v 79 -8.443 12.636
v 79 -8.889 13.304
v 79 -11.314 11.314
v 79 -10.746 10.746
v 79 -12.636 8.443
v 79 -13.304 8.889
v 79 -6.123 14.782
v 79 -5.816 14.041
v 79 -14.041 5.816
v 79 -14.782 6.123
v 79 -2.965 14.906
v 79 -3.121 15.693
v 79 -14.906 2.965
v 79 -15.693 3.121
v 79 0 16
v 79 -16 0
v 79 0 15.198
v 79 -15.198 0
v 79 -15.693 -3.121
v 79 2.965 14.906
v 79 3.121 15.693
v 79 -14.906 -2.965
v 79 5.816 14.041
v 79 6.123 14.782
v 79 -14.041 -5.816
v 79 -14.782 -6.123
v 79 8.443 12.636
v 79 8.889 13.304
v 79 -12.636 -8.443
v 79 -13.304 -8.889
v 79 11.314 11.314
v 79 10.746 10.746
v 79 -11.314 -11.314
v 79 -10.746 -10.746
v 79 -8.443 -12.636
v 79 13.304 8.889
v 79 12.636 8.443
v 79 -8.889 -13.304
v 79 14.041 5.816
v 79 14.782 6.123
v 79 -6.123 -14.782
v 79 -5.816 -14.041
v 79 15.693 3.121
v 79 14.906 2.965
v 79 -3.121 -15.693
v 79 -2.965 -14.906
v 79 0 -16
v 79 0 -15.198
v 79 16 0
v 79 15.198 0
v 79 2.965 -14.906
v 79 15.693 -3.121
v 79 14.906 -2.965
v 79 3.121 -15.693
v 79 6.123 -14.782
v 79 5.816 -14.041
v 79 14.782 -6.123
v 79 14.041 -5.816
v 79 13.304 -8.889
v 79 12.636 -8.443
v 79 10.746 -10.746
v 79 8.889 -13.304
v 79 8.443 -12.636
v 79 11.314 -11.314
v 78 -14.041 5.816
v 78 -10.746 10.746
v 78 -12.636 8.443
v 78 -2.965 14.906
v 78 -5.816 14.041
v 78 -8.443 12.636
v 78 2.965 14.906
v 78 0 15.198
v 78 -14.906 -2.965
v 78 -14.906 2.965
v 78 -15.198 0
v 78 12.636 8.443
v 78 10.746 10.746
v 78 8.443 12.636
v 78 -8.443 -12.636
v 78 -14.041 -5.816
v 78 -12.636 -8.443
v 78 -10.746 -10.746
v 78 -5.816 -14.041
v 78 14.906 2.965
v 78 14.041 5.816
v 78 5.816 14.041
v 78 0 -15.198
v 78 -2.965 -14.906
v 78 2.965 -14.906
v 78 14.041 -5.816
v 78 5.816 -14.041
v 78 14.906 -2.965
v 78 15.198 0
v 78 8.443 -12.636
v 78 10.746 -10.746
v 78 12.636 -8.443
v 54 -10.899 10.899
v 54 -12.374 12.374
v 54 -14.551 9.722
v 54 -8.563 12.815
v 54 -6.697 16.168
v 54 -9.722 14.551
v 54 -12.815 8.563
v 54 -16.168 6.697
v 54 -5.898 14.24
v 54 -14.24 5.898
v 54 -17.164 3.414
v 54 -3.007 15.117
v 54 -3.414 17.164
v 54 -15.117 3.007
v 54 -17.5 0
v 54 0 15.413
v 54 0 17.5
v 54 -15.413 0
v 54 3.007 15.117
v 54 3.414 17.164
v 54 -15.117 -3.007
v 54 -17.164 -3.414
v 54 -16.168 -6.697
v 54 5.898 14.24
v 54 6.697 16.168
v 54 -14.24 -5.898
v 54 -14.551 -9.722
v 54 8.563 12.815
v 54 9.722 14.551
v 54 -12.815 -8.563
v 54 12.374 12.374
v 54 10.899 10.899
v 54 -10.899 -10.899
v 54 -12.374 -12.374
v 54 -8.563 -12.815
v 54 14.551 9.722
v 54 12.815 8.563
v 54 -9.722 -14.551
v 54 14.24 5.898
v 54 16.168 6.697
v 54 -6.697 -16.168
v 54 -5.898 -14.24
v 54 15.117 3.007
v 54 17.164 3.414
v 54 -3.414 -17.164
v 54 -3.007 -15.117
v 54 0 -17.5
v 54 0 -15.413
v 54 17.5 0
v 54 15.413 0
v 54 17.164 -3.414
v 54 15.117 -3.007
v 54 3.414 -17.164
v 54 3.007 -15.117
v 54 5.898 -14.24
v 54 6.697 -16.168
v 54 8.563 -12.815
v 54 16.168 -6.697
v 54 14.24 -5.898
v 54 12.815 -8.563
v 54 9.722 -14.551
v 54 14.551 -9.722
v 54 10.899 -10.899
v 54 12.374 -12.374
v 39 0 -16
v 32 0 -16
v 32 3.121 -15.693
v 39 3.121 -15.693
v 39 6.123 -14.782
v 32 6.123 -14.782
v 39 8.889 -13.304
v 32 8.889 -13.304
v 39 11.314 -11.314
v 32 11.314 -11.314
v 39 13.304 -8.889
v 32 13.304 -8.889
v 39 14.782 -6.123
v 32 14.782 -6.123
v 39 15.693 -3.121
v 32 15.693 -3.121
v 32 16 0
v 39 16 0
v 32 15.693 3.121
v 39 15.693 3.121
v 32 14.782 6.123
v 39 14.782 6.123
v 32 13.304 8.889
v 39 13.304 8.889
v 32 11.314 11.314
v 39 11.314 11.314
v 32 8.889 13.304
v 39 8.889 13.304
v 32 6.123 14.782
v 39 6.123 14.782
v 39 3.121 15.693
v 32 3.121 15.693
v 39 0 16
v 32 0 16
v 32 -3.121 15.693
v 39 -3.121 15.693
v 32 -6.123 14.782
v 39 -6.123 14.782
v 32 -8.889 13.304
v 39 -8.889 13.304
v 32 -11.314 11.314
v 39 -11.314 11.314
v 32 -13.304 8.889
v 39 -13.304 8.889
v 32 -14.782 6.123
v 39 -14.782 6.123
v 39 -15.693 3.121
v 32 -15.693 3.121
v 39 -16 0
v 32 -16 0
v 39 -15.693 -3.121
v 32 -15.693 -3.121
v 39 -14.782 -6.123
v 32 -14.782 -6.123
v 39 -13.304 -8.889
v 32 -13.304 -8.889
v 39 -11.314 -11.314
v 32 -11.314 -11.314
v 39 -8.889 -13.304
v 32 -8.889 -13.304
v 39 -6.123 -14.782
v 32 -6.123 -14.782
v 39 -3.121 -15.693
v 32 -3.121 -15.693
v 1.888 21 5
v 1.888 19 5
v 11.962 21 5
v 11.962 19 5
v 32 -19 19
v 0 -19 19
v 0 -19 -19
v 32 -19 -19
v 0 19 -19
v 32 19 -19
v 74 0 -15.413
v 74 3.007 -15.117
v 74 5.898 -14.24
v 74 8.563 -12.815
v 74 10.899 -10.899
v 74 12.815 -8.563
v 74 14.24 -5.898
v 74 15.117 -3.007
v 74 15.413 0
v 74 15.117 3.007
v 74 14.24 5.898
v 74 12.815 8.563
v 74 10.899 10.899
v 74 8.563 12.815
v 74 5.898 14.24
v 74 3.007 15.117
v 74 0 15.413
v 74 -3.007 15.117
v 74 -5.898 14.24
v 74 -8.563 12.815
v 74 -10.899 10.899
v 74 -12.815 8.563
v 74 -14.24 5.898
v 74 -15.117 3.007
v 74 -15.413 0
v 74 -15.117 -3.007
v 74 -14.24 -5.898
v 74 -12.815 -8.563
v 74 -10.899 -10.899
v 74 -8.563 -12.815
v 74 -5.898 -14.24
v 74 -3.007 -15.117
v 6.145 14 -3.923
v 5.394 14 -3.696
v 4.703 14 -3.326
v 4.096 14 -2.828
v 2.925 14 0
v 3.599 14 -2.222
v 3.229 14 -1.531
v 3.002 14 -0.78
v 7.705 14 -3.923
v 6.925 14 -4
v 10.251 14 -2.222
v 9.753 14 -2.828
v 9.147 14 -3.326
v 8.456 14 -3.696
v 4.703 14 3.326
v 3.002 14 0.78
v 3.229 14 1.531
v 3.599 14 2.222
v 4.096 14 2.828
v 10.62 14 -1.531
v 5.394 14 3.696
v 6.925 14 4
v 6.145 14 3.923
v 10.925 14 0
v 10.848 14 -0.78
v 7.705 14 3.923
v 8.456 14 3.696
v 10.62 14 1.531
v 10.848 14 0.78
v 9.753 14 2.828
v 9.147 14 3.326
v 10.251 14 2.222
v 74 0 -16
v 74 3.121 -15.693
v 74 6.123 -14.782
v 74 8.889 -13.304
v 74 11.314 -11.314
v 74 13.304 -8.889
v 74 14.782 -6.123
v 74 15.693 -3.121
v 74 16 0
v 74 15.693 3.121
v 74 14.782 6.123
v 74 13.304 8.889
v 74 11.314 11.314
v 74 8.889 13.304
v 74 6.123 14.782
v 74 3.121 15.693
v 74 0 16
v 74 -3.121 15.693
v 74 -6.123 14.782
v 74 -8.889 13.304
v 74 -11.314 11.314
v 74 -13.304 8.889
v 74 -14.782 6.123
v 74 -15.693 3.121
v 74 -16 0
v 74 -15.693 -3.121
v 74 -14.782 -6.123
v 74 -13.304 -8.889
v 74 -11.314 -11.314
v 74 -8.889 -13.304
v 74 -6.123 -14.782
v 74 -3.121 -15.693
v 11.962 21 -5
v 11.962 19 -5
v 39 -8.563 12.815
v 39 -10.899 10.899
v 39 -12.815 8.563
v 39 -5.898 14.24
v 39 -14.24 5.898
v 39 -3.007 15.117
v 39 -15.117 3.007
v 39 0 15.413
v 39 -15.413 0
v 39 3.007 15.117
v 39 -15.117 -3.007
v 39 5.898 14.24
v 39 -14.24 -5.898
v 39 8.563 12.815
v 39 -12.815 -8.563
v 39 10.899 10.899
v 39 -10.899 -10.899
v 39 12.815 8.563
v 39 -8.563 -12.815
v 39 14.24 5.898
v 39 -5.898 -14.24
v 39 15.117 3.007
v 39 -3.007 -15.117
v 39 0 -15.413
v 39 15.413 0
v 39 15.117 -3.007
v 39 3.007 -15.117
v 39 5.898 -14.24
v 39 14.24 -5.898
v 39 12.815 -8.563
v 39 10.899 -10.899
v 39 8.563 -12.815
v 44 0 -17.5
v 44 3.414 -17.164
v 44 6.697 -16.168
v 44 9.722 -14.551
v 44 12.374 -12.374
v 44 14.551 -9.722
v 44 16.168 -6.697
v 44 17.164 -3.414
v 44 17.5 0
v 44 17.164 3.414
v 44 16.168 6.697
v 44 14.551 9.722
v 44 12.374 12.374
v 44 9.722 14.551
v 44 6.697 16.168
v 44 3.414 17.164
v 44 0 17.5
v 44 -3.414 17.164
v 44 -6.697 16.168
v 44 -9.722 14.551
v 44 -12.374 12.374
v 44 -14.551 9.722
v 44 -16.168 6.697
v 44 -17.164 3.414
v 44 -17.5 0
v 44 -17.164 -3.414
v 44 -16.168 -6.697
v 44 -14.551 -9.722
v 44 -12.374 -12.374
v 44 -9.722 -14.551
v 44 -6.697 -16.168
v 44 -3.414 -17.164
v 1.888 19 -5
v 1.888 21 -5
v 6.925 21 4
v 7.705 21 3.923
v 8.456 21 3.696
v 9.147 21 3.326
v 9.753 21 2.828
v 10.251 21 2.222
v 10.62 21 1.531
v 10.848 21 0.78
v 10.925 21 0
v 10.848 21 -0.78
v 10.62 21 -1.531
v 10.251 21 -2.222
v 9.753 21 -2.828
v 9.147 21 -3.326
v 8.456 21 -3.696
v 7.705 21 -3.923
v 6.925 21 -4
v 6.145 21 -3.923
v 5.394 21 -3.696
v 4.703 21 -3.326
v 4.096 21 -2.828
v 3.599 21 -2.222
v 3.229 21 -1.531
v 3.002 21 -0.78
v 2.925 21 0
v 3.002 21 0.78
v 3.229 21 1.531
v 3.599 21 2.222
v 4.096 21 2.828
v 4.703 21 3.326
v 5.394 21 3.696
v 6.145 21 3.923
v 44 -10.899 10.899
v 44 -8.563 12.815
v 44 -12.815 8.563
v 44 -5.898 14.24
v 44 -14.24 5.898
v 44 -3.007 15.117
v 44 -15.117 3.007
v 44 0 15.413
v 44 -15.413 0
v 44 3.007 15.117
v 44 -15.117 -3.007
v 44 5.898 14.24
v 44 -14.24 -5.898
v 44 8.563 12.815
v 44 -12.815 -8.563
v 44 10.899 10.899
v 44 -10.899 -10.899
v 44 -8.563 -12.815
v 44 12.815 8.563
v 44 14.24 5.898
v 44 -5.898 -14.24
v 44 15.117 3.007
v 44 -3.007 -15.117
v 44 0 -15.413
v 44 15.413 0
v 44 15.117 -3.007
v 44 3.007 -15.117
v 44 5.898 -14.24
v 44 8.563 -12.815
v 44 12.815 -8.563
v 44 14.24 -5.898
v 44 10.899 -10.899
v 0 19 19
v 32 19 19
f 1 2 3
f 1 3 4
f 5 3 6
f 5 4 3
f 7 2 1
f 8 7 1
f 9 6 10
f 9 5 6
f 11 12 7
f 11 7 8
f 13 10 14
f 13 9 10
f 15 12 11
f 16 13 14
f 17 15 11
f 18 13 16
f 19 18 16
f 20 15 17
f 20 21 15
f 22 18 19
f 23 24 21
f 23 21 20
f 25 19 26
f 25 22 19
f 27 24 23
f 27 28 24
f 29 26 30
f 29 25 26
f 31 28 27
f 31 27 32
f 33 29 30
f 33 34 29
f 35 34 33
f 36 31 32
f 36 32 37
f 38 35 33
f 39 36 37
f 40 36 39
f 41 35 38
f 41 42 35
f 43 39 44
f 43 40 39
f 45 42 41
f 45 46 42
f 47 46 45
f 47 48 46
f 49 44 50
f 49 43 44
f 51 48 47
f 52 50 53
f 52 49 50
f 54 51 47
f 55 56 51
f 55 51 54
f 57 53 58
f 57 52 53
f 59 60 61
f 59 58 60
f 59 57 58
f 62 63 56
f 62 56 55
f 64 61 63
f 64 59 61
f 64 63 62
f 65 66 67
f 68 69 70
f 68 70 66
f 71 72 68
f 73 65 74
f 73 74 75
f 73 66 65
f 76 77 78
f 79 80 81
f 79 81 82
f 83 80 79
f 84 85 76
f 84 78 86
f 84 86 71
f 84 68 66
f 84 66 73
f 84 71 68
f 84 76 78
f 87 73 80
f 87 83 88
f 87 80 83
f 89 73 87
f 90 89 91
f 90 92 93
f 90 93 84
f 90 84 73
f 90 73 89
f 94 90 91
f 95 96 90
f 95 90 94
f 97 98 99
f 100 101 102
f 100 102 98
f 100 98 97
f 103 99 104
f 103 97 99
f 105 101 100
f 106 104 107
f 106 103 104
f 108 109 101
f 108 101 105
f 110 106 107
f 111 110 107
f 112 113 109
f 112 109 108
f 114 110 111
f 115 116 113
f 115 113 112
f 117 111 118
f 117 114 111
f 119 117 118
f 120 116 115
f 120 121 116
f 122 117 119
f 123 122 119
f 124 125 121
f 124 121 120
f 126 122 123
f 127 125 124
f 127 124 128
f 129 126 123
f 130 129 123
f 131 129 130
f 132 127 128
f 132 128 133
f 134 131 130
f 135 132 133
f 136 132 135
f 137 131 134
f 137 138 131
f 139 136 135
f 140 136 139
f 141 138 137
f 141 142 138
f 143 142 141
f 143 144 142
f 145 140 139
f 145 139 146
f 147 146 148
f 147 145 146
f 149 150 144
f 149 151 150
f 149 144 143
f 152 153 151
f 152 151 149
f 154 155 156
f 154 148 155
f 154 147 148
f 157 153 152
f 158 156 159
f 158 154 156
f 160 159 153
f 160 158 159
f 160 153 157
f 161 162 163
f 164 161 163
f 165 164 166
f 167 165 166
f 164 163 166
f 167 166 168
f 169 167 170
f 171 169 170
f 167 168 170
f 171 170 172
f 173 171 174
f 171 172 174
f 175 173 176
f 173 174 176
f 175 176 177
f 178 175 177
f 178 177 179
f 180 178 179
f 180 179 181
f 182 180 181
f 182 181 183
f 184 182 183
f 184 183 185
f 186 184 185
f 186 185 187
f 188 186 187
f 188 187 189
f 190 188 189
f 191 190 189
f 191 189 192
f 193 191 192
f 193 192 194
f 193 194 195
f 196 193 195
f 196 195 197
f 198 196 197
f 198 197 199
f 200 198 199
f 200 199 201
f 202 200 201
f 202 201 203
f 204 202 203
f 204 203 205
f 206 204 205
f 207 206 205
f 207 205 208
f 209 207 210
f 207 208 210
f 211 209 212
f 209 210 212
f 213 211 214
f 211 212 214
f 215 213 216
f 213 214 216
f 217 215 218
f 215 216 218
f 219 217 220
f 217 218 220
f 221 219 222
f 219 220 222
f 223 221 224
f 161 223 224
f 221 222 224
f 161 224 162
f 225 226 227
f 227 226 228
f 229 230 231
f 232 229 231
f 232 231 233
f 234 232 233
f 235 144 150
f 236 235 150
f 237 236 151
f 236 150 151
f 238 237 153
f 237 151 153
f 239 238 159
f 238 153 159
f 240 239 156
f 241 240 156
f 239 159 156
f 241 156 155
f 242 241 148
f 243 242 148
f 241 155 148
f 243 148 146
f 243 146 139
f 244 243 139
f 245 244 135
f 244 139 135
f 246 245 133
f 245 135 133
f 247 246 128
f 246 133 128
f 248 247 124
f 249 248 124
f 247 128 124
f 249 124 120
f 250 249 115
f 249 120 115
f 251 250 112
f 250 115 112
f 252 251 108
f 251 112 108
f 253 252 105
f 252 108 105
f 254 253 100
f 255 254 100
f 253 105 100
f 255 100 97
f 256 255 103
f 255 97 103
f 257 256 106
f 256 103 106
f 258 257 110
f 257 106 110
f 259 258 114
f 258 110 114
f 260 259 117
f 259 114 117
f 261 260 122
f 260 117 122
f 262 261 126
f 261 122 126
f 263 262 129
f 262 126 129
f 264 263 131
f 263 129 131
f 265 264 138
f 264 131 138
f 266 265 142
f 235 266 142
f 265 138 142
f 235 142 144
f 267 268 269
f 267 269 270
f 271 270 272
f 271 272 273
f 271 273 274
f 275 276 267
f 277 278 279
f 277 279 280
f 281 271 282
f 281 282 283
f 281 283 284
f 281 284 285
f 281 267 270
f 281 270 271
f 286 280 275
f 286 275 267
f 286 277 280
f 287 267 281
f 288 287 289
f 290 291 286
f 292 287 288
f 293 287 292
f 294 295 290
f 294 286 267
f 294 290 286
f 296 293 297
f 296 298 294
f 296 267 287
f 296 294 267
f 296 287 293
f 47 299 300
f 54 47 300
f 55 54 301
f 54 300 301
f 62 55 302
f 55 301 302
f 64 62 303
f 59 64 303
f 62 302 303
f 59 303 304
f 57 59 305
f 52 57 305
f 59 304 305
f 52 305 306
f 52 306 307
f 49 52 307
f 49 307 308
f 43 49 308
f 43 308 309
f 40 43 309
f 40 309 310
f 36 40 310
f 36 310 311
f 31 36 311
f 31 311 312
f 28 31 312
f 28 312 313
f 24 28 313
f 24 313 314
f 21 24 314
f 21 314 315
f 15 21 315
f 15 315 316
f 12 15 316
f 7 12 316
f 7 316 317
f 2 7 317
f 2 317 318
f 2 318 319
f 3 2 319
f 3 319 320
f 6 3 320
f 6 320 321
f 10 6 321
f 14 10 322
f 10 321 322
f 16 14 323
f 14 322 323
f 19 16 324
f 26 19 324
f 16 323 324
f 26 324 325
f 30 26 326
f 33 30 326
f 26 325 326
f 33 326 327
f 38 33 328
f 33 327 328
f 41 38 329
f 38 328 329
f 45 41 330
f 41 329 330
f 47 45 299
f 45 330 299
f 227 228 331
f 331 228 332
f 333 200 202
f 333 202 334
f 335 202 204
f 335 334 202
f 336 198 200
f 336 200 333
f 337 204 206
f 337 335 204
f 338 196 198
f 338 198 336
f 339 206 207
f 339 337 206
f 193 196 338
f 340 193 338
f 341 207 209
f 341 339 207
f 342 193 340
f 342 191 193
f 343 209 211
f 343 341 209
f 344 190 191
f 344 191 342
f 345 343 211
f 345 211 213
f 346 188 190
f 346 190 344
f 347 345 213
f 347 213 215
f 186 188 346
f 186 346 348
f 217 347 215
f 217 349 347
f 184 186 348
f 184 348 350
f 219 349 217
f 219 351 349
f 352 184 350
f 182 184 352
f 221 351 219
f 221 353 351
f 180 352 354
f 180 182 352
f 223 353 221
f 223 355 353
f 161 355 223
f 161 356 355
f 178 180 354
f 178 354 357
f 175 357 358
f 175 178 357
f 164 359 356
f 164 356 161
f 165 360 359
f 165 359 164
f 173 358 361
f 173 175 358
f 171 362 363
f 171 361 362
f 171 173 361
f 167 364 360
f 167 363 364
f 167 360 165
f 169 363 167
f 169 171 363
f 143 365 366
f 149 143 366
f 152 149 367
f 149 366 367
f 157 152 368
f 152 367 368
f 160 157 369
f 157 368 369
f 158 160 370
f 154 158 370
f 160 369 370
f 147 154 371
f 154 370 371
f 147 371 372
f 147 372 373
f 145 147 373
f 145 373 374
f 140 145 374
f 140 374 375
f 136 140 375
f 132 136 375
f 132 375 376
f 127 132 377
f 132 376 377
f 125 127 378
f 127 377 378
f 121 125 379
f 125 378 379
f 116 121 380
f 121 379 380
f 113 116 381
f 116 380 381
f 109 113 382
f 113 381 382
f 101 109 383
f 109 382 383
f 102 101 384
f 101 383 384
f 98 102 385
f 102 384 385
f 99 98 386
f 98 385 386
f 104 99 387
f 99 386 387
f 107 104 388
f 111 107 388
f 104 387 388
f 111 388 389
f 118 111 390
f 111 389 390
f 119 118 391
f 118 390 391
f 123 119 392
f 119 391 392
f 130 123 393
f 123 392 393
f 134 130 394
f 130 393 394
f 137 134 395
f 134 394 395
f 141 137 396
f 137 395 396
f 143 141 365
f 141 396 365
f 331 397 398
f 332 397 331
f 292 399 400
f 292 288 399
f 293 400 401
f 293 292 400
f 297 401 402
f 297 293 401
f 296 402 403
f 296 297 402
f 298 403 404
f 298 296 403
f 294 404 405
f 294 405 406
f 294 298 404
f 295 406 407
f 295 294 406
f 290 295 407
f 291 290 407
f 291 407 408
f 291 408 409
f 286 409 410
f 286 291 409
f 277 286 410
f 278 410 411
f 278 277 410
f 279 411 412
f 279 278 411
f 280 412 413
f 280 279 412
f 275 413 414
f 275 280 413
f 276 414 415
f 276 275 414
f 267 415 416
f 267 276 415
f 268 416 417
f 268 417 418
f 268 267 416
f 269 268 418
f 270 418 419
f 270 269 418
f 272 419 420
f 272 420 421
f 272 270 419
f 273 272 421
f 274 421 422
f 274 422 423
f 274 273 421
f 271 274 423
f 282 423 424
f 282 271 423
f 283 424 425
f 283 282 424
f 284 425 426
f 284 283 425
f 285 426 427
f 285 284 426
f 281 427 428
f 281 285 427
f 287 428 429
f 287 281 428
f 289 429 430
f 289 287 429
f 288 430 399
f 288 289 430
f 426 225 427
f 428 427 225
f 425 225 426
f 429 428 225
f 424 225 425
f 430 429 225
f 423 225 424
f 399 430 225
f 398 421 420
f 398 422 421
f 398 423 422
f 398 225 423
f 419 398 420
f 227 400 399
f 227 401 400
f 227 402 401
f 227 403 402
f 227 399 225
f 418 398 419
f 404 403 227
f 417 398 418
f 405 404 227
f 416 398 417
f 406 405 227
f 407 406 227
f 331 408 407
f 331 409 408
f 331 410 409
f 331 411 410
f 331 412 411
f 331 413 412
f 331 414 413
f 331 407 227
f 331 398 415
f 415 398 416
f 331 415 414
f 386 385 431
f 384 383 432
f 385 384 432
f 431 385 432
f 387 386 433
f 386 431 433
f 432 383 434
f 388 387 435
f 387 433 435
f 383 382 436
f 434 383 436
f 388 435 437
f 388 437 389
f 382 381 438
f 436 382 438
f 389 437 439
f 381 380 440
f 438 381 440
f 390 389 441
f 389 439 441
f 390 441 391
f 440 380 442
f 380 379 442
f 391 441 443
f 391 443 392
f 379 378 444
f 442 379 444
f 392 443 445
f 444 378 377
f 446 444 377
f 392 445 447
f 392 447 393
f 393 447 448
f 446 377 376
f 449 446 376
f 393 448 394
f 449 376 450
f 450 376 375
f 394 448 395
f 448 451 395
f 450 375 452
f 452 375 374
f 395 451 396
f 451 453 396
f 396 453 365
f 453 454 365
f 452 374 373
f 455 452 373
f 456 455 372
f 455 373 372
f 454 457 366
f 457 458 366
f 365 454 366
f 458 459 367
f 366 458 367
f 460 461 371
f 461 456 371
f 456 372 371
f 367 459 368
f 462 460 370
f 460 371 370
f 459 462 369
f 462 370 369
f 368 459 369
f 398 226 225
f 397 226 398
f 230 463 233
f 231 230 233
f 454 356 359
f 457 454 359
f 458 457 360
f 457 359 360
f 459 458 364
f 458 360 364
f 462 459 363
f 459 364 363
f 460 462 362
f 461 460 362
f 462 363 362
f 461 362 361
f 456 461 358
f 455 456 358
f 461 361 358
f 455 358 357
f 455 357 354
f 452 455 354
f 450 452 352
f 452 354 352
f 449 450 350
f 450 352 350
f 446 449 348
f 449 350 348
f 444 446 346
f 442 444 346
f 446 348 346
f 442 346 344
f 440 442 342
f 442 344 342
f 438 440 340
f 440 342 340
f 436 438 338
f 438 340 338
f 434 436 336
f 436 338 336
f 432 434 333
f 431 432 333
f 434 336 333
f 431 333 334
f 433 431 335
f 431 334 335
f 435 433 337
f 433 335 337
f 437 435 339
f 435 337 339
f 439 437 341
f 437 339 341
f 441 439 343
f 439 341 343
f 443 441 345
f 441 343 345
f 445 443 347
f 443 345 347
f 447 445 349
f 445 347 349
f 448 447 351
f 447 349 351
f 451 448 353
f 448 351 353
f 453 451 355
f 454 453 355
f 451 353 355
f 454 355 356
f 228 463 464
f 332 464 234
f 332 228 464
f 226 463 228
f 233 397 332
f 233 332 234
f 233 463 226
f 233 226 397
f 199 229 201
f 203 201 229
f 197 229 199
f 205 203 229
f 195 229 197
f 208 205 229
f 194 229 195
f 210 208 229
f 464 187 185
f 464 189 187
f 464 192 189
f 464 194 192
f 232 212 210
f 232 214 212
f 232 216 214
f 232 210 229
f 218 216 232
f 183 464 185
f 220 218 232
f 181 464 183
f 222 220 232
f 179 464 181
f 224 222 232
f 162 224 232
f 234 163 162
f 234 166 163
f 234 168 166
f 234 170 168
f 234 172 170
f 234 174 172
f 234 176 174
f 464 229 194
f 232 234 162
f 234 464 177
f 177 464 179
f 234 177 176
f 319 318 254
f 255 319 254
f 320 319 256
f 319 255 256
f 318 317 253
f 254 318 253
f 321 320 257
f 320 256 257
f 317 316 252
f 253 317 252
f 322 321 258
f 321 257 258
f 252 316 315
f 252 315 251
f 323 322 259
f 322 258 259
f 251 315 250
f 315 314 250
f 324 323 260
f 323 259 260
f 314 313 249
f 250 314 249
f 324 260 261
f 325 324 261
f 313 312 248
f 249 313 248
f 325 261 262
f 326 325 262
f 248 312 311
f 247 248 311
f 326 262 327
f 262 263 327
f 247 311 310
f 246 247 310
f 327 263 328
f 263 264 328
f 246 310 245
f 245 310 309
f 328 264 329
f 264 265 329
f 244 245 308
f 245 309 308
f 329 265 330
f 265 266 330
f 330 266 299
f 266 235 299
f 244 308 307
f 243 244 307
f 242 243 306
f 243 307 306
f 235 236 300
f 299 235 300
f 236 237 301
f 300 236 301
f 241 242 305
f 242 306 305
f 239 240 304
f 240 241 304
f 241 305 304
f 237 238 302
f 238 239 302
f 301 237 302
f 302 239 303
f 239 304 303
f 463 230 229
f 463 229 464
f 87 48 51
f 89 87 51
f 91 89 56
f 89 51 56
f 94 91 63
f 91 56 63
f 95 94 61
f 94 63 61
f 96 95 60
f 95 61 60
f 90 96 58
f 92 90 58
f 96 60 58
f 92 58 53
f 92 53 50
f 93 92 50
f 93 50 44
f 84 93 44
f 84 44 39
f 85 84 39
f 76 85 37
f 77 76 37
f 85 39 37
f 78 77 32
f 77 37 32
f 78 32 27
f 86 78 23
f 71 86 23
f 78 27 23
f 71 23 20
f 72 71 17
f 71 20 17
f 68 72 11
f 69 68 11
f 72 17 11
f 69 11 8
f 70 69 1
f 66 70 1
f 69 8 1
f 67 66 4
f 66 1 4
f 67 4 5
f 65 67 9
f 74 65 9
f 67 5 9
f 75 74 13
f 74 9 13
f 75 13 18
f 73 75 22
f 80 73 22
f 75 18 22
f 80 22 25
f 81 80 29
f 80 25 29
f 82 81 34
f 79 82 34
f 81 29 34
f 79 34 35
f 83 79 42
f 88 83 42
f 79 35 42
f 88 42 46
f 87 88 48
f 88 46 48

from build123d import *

# Parameters (mm, degrees)
SKETCH1_W           = 38
SKETCH1_H           = 38
BOSS_EXTRUDE1_DEPTH = 32
SKETCH2_R           = 16
BOSS_EXTRUDE2_DEPTH = 47
SKETCH3_W           = 10.074074074
SKETCH3_H           = 10
SKETCH3_R           = 4
BOSS_EXTRUDE3_DEPTH = 2
CUT_EXTRUDE1_START  = -5
SKETCH3_2_R         = 4
CUT_EXTRUDE1_DEPTH  = 5
CUT_EXTRUDE2_START  = -25
SKETCH4_R           = 16
SKETCH4_R_2         = 15.412875145
CUT_EXTRUDE2_DEPTH  = 20
BOSS_EXTRUDE4_START = -35
SKETCH5_R           = 17.5
SKETCH5_R_2         = 16
BOSS_EXTRUDE4_DEPTH = 10
CUT_EXTRUDE3_START  = -40
SKETCH4_2_R         = 16
SKETCH4_2_R_2       = 15.412875145
CUT_EXTRUDE3_DEPTH  = 5
SKETCH6_R           = 15.197678489
CUT_EXTRUDE4_DEPTH  = 1


with BuildPart() as part:
    # Sketch1 → Boss-Extrude1 (new body)
    with BuildSketch(Plane(origin=(0, 0, 0), x_dir=(0, 0, -1), z_dir=(1, 0, 0))):
        Rectangle(SKETCH1_W, SKETCH1_H)
    extrude(amount=BOSS_EXTRUDE1_DEPTH)

    # Sketch2 → Boss-Extrude2 (add)
    with BuildSketch(Plane(origin=(32, 0, 0), x_dir=(0, 0, -1), z_dir=(1, 0, 0))):
        Circle(SKETCH2_R)
    extrude(amount=BOSS_EXTRUDE2_DEPTH)

    # Sketch3 → Boss-Extrude3 (add)
    with BuildSketch(Plane(origin=(0, 19, 0), x_dir=(1, 0, 0), z_dir=(0, 1, 0))):
        with Locations((6.924898334, 0)):
            Rectangle(SKETCH3_W, SKETCH3_H)
        with Locations((6.924898334, 0)):
            Circle(SKETCH3_R, mode=Mode.SUBTRACT)
    extrude(amount=BOSS_EXTRUDE3_DEPTH)

    # Sketch3<2> → Cut-Extrude1 (cut)
    with BuildSketch(Plane(origin=(0, 19, 0), x_dir=(1, 0, 0), z_dir=(0, 1, 0)).offset(CUT_EXTRUDE1_START)):
        with Locations((6.924898334, 0)):
            Circle(SKETCH3_2_R)
    extrude(amount=CUT_EXTRUDE1_DEPTH, mode=Mode.SUBTRACT)

    # Sketch4 → Cut-Extrude2 (cut)
    with BuildSketch(Plane(origin=(79, 0, 0), x_dir=(0, 0, -1), z_dir=(1, 0, 0)).offset(CUT_EXTRUDE2_START)):
        Circle(SKETCH4_R)
        Circle(SKETCH4_R_2, mode=Mode.SUBTRACT)
    extrude(amount=CUT_EXTRUDE2_DEPTH, mode=Mode.SUBTRACT)

    # Sketch5 → Boss-Extrude4 (add)
    with BuildSketch(Plane(origin=(79, 0, 0), x_dir=(0, 0, -1), z_dir=(1, 0, 0)).offset(BOSS_EXTRUDE4_START)):
        Circle(SKETCH5_R)
        Circle(SKETCH5_R_2, mode=Mode.SUBTRACT)
    extrude(amount=BOSS_EXTRUDE4_DEPTH)

    # Sketch4<2> → Cut-Extrude3 (cut)
    with BuildSketch(Plane(origin=(79, 0, 0), x_dir=(0, 0, -1), z_dir=(1, 0, 0)).offset(CUT_EXTRUDE3_START)):
        Circle(SKETCH4_2_R)
        Circle(SKETCH4_2_R_2, mode=Mode.SUBTRACT)
    extrude(amount=CUT_EXTRUDE3_DEPTH, mode=Mode.SUBTRACT)

    # Sketch6 → Cut-Extrude4 (cut)
    with BuildSketch(Plane(origin=(79, 0, 0), x_dir=(0, 0, -1), z_dir=(1, 0, 0))):
        Circle(SKETCH6_R)
    extrude(amount=-CUT_EXTRUDE4_DEPTH, mode=Mode.SUBTRACT)


solid = part.part
